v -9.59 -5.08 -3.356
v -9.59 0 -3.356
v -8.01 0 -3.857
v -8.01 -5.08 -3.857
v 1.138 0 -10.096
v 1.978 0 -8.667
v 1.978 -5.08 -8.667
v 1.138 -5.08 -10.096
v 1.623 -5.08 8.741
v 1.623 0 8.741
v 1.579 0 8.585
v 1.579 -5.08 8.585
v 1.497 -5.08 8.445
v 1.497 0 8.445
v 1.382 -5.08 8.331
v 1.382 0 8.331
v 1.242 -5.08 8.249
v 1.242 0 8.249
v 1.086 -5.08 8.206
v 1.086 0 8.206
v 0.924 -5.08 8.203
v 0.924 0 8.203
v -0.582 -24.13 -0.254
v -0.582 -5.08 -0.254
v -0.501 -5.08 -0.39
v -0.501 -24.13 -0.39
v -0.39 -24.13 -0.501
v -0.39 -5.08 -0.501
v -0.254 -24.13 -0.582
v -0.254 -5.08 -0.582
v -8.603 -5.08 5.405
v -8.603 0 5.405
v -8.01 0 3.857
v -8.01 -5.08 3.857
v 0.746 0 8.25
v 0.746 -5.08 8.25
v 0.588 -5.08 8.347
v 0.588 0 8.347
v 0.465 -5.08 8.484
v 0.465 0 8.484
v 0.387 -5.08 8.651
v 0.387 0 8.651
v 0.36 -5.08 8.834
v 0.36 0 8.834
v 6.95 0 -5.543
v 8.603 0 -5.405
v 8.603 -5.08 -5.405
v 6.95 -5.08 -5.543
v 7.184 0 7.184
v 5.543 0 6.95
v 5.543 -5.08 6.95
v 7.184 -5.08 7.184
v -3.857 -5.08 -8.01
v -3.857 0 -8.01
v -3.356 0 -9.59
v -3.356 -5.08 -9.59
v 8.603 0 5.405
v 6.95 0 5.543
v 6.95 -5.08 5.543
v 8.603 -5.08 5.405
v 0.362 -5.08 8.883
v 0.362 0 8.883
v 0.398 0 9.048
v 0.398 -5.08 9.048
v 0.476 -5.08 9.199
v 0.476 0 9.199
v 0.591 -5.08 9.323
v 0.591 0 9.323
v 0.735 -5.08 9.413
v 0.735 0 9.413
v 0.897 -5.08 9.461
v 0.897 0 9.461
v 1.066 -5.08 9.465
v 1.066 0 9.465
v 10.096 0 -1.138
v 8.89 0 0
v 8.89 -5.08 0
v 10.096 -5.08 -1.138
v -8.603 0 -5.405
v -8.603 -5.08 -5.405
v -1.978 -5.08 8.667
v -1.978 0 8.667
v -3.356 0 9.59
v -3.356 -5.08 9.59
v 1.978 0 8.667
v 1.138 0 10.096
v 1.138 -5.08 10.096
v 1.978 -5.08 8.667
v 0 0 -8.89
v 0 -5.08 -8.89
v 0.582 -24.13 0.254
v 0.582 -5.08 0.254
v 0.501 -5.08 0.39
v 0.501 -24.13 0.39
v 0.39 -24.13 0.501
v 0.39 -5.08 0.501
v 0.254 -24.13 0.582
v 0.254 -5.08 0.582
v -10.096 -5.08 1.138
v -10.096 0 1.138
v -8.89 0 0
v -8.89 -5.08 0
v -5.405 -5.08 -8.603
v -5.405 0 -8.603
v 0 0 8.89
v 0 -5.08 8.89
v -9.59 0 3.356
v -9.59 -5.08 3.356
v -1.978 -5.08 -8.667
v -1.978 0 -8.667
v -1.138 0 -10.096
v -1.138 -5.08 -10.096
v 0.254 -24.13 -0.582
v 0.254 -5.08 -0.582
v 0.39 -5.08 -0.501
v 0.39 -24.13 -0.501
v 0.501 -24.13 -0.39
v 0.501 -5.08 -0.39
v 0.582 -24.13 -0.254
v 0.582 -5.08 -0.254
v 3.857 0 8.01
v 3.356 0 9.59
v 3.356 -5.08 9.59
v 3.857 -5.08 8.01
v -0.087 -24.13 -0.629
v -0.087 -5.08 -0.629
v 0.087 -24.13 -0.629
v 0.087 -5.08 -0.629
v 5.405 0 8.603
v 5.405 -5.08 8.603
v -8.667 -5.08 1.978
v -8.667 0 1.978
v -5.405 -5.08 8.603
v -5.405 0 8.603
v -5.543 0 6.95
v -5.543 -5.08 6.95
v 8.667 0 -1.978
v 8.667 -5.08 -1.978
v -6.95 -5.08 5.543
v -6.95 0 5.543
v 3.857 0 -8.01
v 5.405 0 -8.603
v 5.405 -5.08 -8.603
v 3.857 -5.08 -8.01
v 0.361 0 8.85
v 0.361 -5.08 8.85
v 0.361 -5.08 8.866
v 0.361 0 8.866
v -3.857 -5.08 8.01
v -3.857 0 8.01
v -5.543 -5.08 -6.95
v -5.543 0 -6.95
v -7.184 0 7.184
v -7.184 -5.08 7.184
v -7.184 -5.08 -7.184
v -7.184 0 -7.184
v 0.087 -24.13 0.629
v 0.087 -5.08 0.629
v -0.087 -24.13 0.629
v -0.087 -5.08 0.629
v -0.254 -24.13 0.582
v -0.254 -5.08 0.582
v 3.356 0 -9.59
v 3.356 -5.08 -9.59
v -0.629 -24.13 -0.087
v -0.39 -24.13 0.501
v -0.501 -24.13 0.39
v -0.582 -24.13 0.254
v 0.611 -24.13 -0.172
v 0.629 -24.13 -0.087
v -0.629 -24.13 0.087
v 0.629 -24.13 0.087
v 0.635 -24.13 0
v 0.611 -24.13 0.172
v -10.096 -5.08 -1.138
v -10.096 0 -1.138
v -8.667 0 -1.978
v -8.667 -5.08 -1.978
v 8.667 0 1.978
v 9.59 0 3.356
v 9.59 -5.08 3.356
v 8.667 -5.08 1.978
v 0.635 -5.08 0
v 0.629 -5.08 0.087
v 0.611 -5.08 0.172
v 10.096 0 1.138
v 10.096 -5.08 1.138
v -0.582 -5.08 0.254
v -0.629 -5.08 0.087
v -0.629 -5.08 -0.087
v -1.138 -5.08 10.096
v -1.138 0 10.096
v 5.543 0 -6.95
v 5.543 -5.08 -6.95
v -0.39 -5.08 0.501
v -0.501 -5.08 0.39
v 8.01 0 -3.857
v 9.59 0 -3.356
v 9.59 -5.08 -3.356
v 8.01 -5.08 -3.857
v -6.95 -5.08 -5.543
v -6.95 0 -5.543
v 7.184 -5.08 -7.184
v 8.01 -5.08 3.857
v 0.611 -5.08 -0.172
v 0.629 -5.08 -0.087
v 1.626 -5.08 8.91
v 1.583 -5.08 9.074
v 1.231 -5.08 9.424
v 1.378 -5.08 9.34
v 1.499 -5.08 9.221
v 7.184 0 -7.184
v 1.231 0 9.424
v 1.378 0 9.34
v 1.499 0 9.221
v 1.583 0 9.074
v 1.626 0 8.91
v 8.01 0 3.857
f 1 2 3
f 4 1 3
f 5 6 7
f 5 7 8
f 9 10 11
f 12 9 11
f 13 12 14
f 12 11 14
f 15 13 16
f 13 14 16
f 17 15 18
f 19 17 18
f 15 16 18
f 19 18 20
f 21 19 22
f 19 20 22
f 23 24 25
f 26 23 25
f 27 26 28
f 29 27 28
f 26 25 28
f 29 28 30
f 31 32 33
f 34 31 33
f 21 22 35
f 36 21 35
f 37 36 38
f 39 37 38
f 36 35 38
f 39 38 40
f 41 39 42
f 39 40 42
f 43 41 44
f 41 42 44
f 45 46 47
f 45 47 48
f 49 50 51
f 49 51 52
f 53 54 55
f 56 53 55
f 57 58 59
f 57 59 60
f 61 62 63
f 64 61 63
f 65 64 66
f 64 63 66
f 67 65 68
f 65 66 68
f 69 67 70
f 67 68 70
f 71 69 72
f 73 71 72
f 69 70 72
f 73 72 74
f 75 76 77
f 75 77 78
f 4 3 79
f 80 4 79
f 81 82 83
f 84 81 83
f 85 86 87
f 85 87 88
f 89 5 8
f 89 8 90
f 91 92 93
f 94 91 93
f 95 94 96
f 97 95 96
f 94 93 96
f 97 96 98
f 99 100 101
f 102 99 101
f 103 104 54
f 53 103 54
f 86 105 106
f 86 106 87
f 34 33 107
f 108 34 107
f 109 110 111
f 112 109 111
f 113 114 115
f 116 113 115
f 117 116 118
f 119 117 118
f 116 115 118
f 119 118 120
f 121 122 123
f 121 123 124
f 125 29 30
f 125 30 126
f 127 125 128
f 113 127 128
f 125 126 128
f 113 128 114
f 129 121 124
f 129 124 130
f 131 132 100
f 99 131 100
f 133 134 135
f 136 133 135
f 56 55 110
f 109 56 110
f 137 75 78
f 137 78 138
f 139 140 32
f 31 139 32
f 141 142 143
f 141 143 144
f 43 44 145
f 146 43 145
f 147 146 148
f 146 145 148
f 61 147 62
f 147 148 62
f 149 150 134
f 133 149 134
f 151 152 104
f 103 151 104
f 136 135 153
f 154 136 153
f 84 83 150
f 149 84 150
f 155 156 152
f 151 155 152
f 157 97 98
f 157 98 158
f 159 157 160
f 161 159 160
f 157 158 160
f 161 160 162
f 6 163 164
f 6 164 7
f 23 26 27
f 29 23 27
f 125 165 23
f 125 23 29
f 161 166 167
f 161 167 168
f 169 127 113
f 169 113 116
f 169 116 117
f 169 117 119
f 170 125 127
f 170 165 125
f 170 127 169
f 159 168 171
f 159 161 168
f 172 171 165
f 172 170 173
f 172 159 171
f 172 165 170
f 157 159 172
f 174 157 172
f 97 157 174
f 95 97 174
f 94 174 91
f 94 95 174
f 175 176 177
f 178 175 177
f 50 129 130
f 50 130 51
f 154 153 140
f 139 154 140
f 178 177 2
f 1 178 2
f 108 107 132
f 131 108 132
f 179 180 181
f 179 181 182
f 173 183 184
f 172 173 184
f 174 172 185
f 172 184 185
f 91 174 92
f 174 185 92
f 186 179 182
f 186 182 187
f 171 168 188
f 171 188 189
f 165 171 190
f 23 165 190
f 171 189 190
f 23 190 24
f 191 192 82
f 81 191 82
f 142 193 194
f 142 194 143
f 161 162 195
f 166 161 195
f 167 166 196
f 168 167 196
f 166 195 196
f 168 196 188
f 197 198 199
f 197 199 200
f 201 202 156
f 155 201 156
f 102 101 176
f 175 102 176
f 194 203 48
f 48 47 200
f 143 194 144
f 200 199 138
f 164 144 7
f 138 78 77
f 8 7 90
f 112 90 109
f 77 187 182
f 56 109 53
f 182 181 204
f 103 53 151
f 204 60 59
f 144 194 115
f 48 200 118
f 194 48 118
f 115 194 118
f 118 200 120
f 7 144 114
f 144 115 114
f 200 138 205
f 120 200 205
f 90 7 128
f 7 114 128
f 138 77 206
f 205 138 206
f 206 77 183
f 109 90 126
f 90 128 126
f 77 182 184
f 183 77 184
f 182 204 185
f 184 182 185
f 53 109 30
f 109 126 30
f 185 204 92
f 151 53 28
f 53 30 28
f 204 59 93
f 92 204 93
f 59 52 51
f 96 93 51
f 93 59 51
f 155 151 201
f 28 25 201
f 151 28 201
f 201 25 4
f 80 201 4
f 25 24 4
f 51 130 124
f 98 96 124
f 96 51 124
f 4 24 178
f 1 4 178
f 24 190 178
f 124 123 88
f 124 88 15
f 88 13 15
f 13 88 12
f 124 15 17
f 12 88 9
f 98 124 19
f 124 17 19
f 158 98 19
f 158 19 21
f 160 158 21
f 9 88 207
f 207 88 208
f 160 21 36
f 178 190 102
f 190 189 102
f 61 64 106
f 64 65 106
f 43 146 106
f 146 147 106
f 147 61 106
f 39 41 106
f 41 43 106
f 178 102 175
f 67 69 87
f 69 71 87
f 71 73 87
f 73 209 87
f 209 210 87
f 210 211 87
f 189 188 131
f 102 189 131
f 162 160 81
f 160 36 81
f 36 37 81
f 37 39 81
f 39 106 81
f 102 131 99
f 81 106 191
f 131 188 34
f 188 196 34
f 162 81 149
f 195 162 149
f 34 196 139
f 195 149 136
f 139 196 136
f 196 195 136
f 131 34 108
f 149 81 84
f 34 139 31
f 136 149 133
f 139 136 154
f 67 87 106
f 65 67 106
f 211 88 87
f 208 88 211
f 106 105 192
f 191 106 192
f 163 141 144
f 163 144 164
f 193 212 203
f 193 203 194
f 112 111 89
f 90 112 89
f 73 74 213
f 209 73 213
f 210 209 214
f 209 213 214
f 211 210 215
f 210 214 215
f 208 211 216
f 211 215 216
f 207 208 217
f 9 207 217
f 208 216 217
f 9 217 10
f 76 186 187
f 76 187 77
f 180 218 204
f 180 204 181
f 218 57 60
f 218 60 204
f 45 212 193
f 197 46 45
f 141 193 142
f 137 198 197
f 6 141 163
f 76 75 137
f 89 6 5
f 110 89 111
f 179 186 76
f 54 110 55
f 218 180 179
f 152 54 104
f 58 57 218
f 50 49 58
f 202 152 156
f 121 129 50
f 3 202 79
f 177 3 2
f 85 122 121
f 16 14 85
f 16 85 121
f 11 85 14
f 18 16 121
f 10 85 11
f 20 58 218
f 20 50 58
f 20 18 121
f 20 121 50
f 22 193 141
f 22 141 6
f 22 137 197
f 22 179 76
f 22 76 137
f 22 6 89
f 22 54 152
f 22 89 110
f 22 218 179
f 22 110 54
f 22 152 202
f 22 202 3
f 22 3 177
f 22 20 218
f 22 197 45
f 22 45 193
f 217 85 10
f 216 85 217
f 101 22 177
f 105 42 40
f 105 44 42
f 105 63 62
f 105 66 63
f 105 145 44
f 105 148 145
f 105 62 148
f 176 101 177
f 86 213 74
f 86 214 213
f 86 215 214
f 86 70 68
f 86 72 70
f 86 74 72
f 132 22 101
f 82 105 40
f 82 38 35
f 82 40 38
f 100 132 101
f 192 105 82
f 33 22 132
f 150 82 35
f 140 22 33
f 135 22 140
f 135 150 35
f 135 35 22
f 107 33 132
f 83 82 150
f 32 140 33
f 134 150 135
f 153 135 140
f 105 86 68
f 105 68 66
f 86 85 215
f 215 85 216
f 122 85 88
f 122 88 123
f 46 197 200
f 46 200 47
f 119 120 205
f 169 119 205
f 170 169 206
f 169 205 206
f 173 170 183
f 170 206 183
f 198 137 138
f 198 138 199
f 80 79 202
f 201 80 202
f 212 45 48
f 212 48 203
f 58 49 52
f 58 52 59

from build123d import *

# Parameters (mm, degrees)
F1_DEPTH = 5.08
F3_W     = 0.508
F3_H     = 0.508
F4_DEPTH = 19.05
F6_DEPTH = 25.4


with BuildPart() as f1:
    # F0 (on Front) → F1 (new body)
    with BuildSketch(Plane.XZ):
        with BuildLine():
            Line((-4.7297651602, 7.5273781311), (0, 0))
            Line((0, 0), (-3.8572264408, 8.0096132357))
            ThreePointArc((-3.8572264408, 8.0096132357), (-4.3002609064, 7.7807362208), (-4.7297651602, 7.5273781311))
        make_face()
        with BuildLine():
            Line((-5.5428243385, 6.9504818791), (0, 0))
            Line((0, 0), (-4.7297651602, 7.5273781311))
            ThreePointArc((-4.7297651602, 7.5273781311), (-5.144387823, 7.250336125), (-5.5428243385, 6.9504818791))
        make_face()
        with BuildLine():
            Line((-5.4054458974, 8.6027178642), (-5.5428243385, 6.9504818791))
            ThreePointArc((-5.5428243385, 6.9504818791), (-5.144387823, 7.250336125), (-4.7297651602, 7.5273781311))
            Line((-4.7297651602, 7.5273781311), (-5.4054458974, 8.6027178642))
        make_face()
        with BuildLine():
            Line((-5.4054458974, 8.6027178642), (-4.7297651602, 7.5273781311))
            ThreePointArc((-4.7297651602, 7.5273781311), (-4.3002609064, 7.7807362208), (-3.8572264408, 8.0096132357))
            Line((-3.8572264408, 8.0096132357), (-5.4054458974, 8.6027178642))
        make_face()
        with BuildLine():
            Line((-3.3556352695, 9.5898546359), (-3.8572264408, 8.0096132357))
            ThreePointArc((-3.8572264408, 8.0096132357), (-3.4020557137, 8.213289044), (-2.9361808608, 8.3911228064))
            Line((-2.9361808608, 8.3911228064), (-3.3556352695, 9.5898546359))
        make_face()
        with BuildLine():
            Line((-3.3556352695, 9.5898546359), (-2.9361808608, 8.3911228064))
            ThreePointArc((-2.9361808608, 8.3911228064), (-2.4610676966, 8.5425549921), (-1.9782111029, 8.6671091393))
            Line((-1.9782111029, 8.6671091393), (-3.3556352695, 9.5898546359))
        make_face()
        with BuildLine():
            Line((-2.9361808608, 8.3911228064), (0, 0))
            Line((0, 0), (-1.9782111029, 8.6671091393))
            ThreePointArc((-1.9782111029, 8.6671091393), (-2.4610676966, 8.5425549921), (-2.9361808608, 8.3911228064))
        make_face()
        with BuildLine():
            Line((-3.8572264408, 8.0096132357), (0, 0))
            Line((0, 0), (-2.9361808608, 8.3911228064))
            ThreePointArc((-2.9361808608, 8.3911228064), (-3.4020557137, 8.213289044), (-3.8572264408, 8.0096132357))
        make_face()
        with BuildLine():
            Line((-0.9953641926, 8.834101546), (0, 0))
            Line((0, 0), (0, 8.89))
            ThreePointArc((0, 8.89), (-0.4984662759, 8.8760143855), (-0.9953641926, 8.834101546))
        make_face()
        with BuildLine():
            ThreePointArc((-0.9953641926, 8.834101546), (-0.4984662759, 8.8760143855), (0, 8.89))
            Line((0, 8.89), (-1.1375590772, 10.0961160525))
            Line((-1.1375590772, 10.0961160525), (-0.9953641926, 8.834101546))
        make_face()
        with BuildLine():
            Line((-1.1375590772, 10.0961160525), (-1.9782111029, 8.6671091393))
            ThreePointArc((-1.9782111029, 8.6671091393), (-1.4891303252, 8.7643933546), (-0.9953641926, 8.834101546))
            Line((-0.9953641926, 8.834101546), (-1.1375590772, 10.0961160525))
        make_face()
        with BuildLine():
            Line((-1.9782111029, 8.6671091393), (0, 0))
            Line((0, 0), (-0.9953641926, 8.834101546))
            ThreePointArc((-0.9953641926, 8.834101546), (-1.4891303252, 8.7643933546), (-1.9782111029, 8.6671091393))
        make_face()
        with BuildLine():
            Line((-6.2861792847, 6.2861792847), (0, 0))
            Line((0, 0), (-5.5428243385, 6.9504818791))
            ThreePointArc((-5.5428243385, 6.9504818791), (-5.923821078, 6.6287588458), (-6.2861792847, 6.2861792847))
        make_face()
        with BuildLine():
            Line((-7.1842048969, 7.1842048969), (-6.2861792847, 6.2861792847))
            ThreePointArc((-6.2861792847, 6.2861792847), (-5.923821078, 6.6287588458), (-5.5428243385, 6.9504818791))
            Line((-5.5428243385, 6.9504818791), (-7.1842048969, 7.1842048969))
        make_face()
        with BuildLine():
            Line((-6.9504818791, 5.5428243385), (0, 0))
            Line((0, 0), (-6.2861792847, 6.2861792847))
            ThreePointArc((-6.2861792847, 6.2861792847), (-6.6287588458, 5.923821078), (-6.9504818791, 5.5428243385))
        make_face()
        with BuildLine():
            Line((-7.1842048969, 7.1842048969), (-6.9504818791, 5.5428243385))
            ThreePointArc((-6.9504818791, 5.5428243385), (-6.6287588458, 5.923821078), (-6.2861792847, 6.2861792847))
            Line((-6.2861792847, 6.2861792847), (-7.1842048969, 7.1842048969))
        make_face()
        with BuildLine():
            Line((-7.5273781311, 4.7297651602), (0, 0))
            Line((0, 0), (-6.9504818791, 5.5428243385))
            ThreePointArc((-6.9504818791, 5.5428243385), (-7.250336125, 5.144387823), (-7.5273781311, 4.7297651602))
        make_face()
        with BuildLine():
            Line((-8.6027178642, 5.4054458974), (-7.5273781311, 4.7297651602))
            ThreePointArc((-7.5273781311, 4.7297651602), (-7.250336125, 5.144387823), (-6.9504818791, 5.5428243385))
            Line((-6.9504818791, 5.5428243385), (-8.6027178642, 5.4054458974))
        make_face()
        with BuildLine():
            Line((-8.6027178642, 5.4054458974), (-8.0096132357, 3.8572264408))
            ThreePointArc((-8.0096132357, 3.8572264408), (-7.7807362208, 4.3002609064), (-7.5273781311, 4.7297651602))
            Line((-7.5273781311, 4.7297651602), (-8.6027178642, 5.4054458974))
        make_face()
        with BuildLine():
            Line((-8.0096132357, 3.8572264408), (0, 0))
            Line((0, 0), (-7.5273781311, 4.7297651602))
            ThreePointArc((-7.5273781311, 4.7297651602), (-7.7807362208, 4.3002609064), (-8.0096132357, 3.8572264408))
        make_face()
        with BuildLine():
            Line((-8.3911228064, 2.9361808608), (0, 0))
            Line((0, 0), (-8.0096132357, 3.8572264408))
            ThreePointArc((-8.0096132357, 3.8572264408), (-8.213289044, 3.4020557137), (-8.3911228064, 2.9361808608))
        make_face()
        with BuildLine():
            Line((-9.5898546359, 3.3556352695), (-8.3911228064, 2.9361808608))
            ThreePointArc((-8.3911228064, 2.9361808608), (-8.213289044, 3.4020557137), (-8.0096132357, 3.8572264408))
            Line((-8.0096132357, 3.8572264408), (-9.5898546359, 3.3556352695))
        make_face()
        with BuildLine():
            Line((-9.5898546359, 3.3556352695), (-8.6671091393, 1.9782111029))
            ThreePointArc((-8.6671091393, 1.9782111029), (-8.5425549921, 2.4610676966), (-8.3911228064, 2.9361808608))
            Line((-8.3911228064, 2.9361808608), (-9.5898546359, 3.3556352695))
        make_face()
        with BuildLine():
            Line((-8.6671091393, 1.9782111029), (0, 0))
            Line((0, 0), (-8.3911228064, 2.9361808608))
            ThreePointArc((-8.3911228064, 2.9361808608), (-8.5425549921, 2.4610676966), (-8.6671091393, 1.9782111029))
        make_face()
        with BuildLine():
            Line((-8.834101546, 0.9953641926), (0, 0))
            Line((0, 0), (-8.6671091393, 1.9782111029))
            ThreePointArc((-8.6671091393, 1.9782111029), (-8.7643933546, 1.4891303252), (-8.834101546, 0.9953641926))
        make_face()
        with BuildLine():
            Line((-10.0961160525, 1.1375590772), (-8.834101546, 0.9953641926))
            ThreePointArc((-8.834101546, 0.9953641926), (-8.7643933546, 1.4891303252), (-8.6671091393, 1.9782111029))
            Line((-8.6671091393, 1.9782111029), (-10.0961160525, 1.1375590772))
        make_face()
        with BuildLine():
            Line((-10.0961160525, 1.1375590772), (-8.89, 0))
            ThreePointArc((-8.89, 0), (-8.8760143855, 0.4984662759), (-8.834101546, 0.9953641926))
            Line((-8.834101546, 0.9953641926), (-10.0961160525, 1.1375590772))
        make_face()
        with BuildLine():
            Line((-8.89, 0), (0, 0))
            Line((0, 0), (-8.834101546, 0.9953641926))
            ThreePointArc((-8.834101546, 0.9953641926), (-8.8760143855, 0.4984662759), (-8.89, 0))
        make_face()
        with BuildLine():
            Line((-8.834101546, -0.9953641926), (0, 0))
            Line((0, 0), (-8.89, 0))
            ThreePointArc((-8.89, 0), (-8.8760143855, -0.4984662759), (-8.834101546, -0.9953641926))
        make_face()
        with BuildLine():
            Line((-10.0961160525, -1.1375590772), (-8.834101546, -0.9953641926))
            ThreePointArc((-8.834101546, -0.9953641926), (-8.8760143855, -0.4984662759), (-8.89, 0))
            Line((-8.89, 0), (-10.0961160525, -1.1375590772))
        make_face()
        with BuildLine():
            Line((-10.0961160525, -1.1375590772), (-8.6671091393, -1.9782111029))
            ThreePointArc((-8.6671091393, -1.9782111029), (-8.7643933546, -1.4891303252), (-8.834101546, -0.9953641926))
            Line((-8.834101546, -0.9953641926), (-10.0961160525, -1.1375590772))
        make_face()
        with BuildLine():
            Line((-8.6671091393, -1.9782111029), (0, 0))
            Line((0, 0), (-8.834101546, -0.9953641926))
            ThreePointArc((-8.834101546, -0.9953641926), (-8.7643933546, -1.4891303252), (-8.6671091393, -1.9782111029))
        make_face()
        with BuildLine():
            Line((-8.3911228064, -2.9361808608), (0, 0))
            Line((0, 0), (-8.6671091393, -1.9782111029))
            ThreePointArc((-8.6671091393, -1.9782111029), (-8.5425549921, -2.4610676966), (-8.3911228064, -2.9361808608))
        make_face()
        with BuildLine():
            Line((-9.5898546359, -3.3556352695), (-8.3911228064, -2.9361808608))
            ThreePointArc((-8.3911228064, -2.9361808608), (-8.5425549921, -2.4610676966), (-8.6671091393, -1.9782111029))
            Line((-8.6671091393, -1.9782111029), (-9.5898546359, -3.3556352695))
        make_face()
        with BuildLine():
            Line((-9.5898546359, -3.3556352695), (-8.0096132357, -3.8572264408))
            ThreePointArc((-8.0096132357, -3.8572264408), (-8.213289044, -3.4020557137), (-8.3911228064, -2.9361808608))
            Line((-8.3911228064, -2.9361808608), (-9.5898546359, -3.3556352695))
        make_face()
        with BuildLine():
            Line((-8.0096132357, -3.8572264408), (0, 0))
            Line((0, 0), (-8.3911228064, -2.9361808608))
            ThreePointArc((-8.3911228064, -2.9361808608), (-8.213289044, -3.4020557137), (-8.0096132357, -3.8572264408))
        make_face()
        with BuildLine():
            Line((-7.5273781311, -4.7297651602), (0, 0))
            Line((0, 0), (-8.0096132357, -3.8572264408))
            ThreePointArc((-8.0096132357, -3.8572264408), (-7.7807362208, -4.3002609064), (-7.5273781311, -4.7297651602))
        make_face()
        with BuildLine():
            Line((-8.6027178642, -5.4054458974), (-7.5273781311, -4.7297651602))
            ThreePointArc((-7.5273781311, -4.7297651602), (-7.7807362208, -4.3002609064), (-8.0096132357, -3.8572264408))
            Line((-8.0096132357, -3.8572264408), (-8.6027178642, -5.4054458974))
        make_face()
        with BuildLine():
            Line((-8.6027178642, -5.4054458974), (-6.9504818791, -5.5428243385))
            ThreePointArc((-6.9504818791, -5.5428243385), (-7.250336125, -5.144387823), (-7.5273781311, -4.7297651602))
            Line((-7.5273781311, -4.7297651602), (-8.6027178642, -5.4054458974))
        make_face()
        with BuildLine():
            Line((-6.9504818791, -5.5428243385), (0, 0))
            Line((0, 0), (-7.5273781311, -4.7297651602))
            ThreePointArc((-7.5273781311, -4.7297651602), (-7.250336125, -5.144387823), (-6.9504818791, -5.5428243385))
        make_face()
        with BuildLine():
            Line((-6.2861792847, -6.2861792847), (0, 0))
            Line((0, 0), (-6.9504818791, -5.5428243385))
            ThreePointArc((-6.9504818791, -5.5428243385), (-6.6287588458, -5.923821078), (-6.2861792847, -6.2861792847))
        make_face()
        with BuildLine():
            Line((-5.5428243385, -6.9504818791), (0, 0))
            Line((0, 0), (-6.2861792847, -6.2861792847))
            ThreePointArc((-6.2861792847, -6.2861792847), (-5.923821078, -6.6287588458), (-5.5428243385, -6.9504818791))
        make_face()
        with BuildLine():
            Line((-4.7297651602, -7.5273781311), (0, 0))
            Line((0, 0), (-5.5428243385, -6.9504818791))
            ThreePointArc((-5.5428243385, -6.9504818791), (-5.144387823, -7.250336125), (-4.7297651602, -7.5273781311))
        make_face()
        with BuildLine():
            Line((-7.1842048969, -7.1842048969), (-6.2861792847, -6.2861792847))
            ThreePointArc((-6.2861792847, -6.2861792847), (-6.6287588458, -5.923821078), (-6.9504818791, -5.5428243385))
            Line((-6.9504818791, -5.5428243385), (-7.1842048969, -7.1842048969))
        make_face()
        with BuildLine():
            Line((-7.1842048969, -7.1842048969), (-5.5428243385, -6.9504818791))
            ThreePointArc((-5.5428243385, -6.9504818791), (-5.923821078, -6.6287588458), (-6.2861792847, -6.2861792847))
            Line((-6.2861792847, -6.2861792847), (-7.1842048969, -7.1842048969))
        make_face()
        with BuildLine():
            Line((-5.4054458974, -8.6027178642), (-4.7297651602, -7.5273781311))
            ThreePointArc((-4.7297651602, -7.5273781311), (-5.144387823, -7.250336125), (-5.5428243385, -6.9504818791))
            Line((-5.5428243385, -6.9504818791), (-5.4054458974, -8.6027178642))
        make_face()
        with BuildLine():
            Line((-5.4054458974, -8.6027178642), (-3.8572264408, -8.0096132357))
            ThreePointArc((-3.8572264408, -8.0096132357), (-4.3002609064, -7.7807362208), (-4.7297651602, -7.5273781311))
            Line((-4.7297651602, -7.5273781311), (-5.4054458974, -8.6027178642))
        make_face()
        with BuildLine():
            Line((-2.9361808608, -8.3911228064), (0, 0))
            Line((0, 0), (-3.8572264408, -8.0096132357))
            ThreePointArc((-3.8572264408, -8.0096132357), (-3.4020557137, -8.213289044), (-2.9361808608, -8.3911228064))
        make_face()
        with BuildLine():
            Line((-3.3556352695, -9.5898546359), (-2.9361808608, -8.3911228064))
            ThreePointArc((-2.9361808608, -8.3911228064), (-3.4020557137, -8.213289044), (-3.8572264408, -8.0096132357))
            Line((-3.8572264408, -8.0096132357), (-3.3556352695, -9.5898546359))
        make_face()
        with BuildLine():
            Line((-3.3556352695, -9.5898546359), (-1.9782111029, -8.6671091393))
            ThreePointArc((-1.9782111029, -8.6671091393), (-2.4610676966, -8.5425549921), (-2.9361808608, -8.3911228064))
            Line((-2.9361808608, -8.3911228064), (-3.3556352695, -9.5898546359))
        make_face()
        with BuildLine():
            Line((-1.9782111029, -8.6671091393), (0, 0))
            Line((0, 0), (-2.9361808608, -8.3911228064))
            ThreePointArc((-2.9361808608, -8.3911228064), (-2.4610676966, -8.5425549921), (-1.9782111029, -8.6671091393))
        make_face()
        with BuildLine():
            Line((-0.9953641926, -8.834101546), (0, 0))
            Line((0, 0), (-1.9782111029, -8.6671091393))
            ThreePointArc((-1.9782111029, -8.6671091393), (-1.4891303252, -8.7643933546), (-0.9953641926, -8.834101546))
        make_face()
        with BuildLine():
            Line((-1.1375590772, -10.0961160525), (0, -8.89))
            ThreePointArc((0, -8.89), (-0.4984662759, -8.8760143855), (-0.9953641926, -8.834101546))
            Line((-0.9953641926, -8.834101546), (-1.1375590772, -10.0961160525))
        make_face()
        with BuildLine():
            ThreePointArc((-0.9953641926, -8.834101546), (-1.4891303252, -8.7643933546), (-1.9782111029, -8.6671091393))
            Line((-1.9782111029, -8.6671091393), (-1.1375590772, -10.0961160525))
            Line((-1.1375590772, -10.0961160525), (-0.9953641926, -8.834101546))
        make_face()
        with BuildLine():
            Line((0, -8.89), (0, 0))
            Line((0, 0), (-0.9953641926, -8.834101546))
            ThreePointArc((-0.9953641926, -8.834101546), (-0.4984662759, -8.8760143855), (0, -8.89))
        make_face()
        with BuildLine():
            Line((-3.8572264408, -8.0096132357), (0, 0))
            Line((0, 0), (-4.7297651602, -7.5273781311))
            ThreePointArc((-4.7297651602, -7.5273781311), (-4.3002609064, -7.7807362208), (-3.8572264408, -8.0096132357))
        make_face()
    extrude(amount=F1_DEPTH)

    # F2: F1 across plane


with BuildPart() as f1_1:
    add(f1.part)
    add(f1.part.mirror(Plane.YZ))

    # F3 (on face) → F4 (join)
    with BuildSketch(Plane.XZ.offset(5.08)):
        with BuildLine():
            Line((0.254, 0.254), (0.254, 0.5819871133))
            ThreePointArc((0.254, 0.5819871133), (0, 0.635), (-0.254, 0.5819871133))
            Line((-0.254, 0.5819871133), (-0.254, 0.254))
            Line((-0.254, 0.254), (0.254, 0.254))
        make_face()
        with BuildLine():
            Line((-0.254, -0.254), (-0.254, 0.254))
            Line((-0.254, 0.254), (-0.5819871133, 0.254))
            ThreePointArc((-0.5819871133, 0.254), (-0.635, 0), (-0.5819871133, -0.254))
            Line((-0.5819871133, -0.254), (-0.254, -0.254))
        make_face()
        Rectangle(F3_W, F3_H)
        with BuildLine():
            ThreePointArc((0.5819871133, -0.254), (0.6216055087, -0.1297366237), (0.635, 0))
            ThreePointArc((0.635, 0), (0.6216055087, 0.1297366237), (0.5819871133, 0.254))
            Line((0.5819871133, 0.254), (0.254, 0.254))
            Line((0.254, 0.254), (0.254, -0.254))
            Line((0.254, -0.254), (0.5819871133, -0.254))
        make_face()
        with BuildLine():
            ThreePointArc((-0.254, -0.5819871133), (0, -0.635), (0.254, -0.5819871133))
            Line((0.254, -0.5819871133), (0.254, -0.254))
            Line((0.254, -0.254), (-0.254, -0.254))
            Line((-0.254, -0.254), (-0.254, -0.5819871133))
        make_face()
        with BuildLine():
            Line((0.254, 0.254), (0.5819871133, 0.254))
            ThreePointArc((0.5819871133, 0.254), (0.4490128061, 0.4490128061), (0.254, 0.5819871133))
            Line((0.254, 0.5819871133), (0.254, 0.254))
        make_face()
        with BuildLine():
            Line((-0.254, 0.254), (-0.254, 0.5819871133))
            ThreePointArc((-0.254, 0.5819871133), (-0.4490128061, 0.4490128061), (-0.5819871133, 0.254))
            Line((-0.5819871133, 0.254), (-0.254, 0.254))
        make_face()
        with BuildLine():
            ThreePointArc((-0.5819871133, -0.254), (-0.4490128061, -0.4490128061), (-0.254, -0.5819871133))
            Line((-0.254, -0.5819871133), (-0.254, -0.254))
            Line((-0.254, -0.254), (-0.5819871133, -0.254))
        make_face()
        with BuildLine():
            ThreePointArc((0.254, -0.5819871133), (0.4490128061, -0.4490128061), (0.5819871133, -0.254))
            Line((0.5819871133, -0.254), (0.254, -0.254))
            Line((0.254, -0.254), (0.254, -0.5819871133))
        make_face()
    extrude(amount=F4_DEPTH)

    # F5 (on face) → F6 (cut)
    with BuildSketch(Plane(origin=(0, 0, 0), x_dir=(-1, 0, 0), z_dir=(0, 1, 0))):
        with BuildLine():
            ThreePointArc((-1.623429695, 8.7405134875), (-1.3102328181, 8.7929170338), (-0.9953641926, 8.834101546))
            Line((-0.9953641926, 8.834101546), (-1.0664616349, 9.4651087992))
            ThreePointArc((-1.0664616349, 9.4651087992), (-1.4988190538, 9.2210875957), (-1.623429695, 8.7405134875))
        make_face()
        with BuildLine():
            ThreePointArc((-0.9953641926, 8.834101546), (-0.6792255648, 8.8640144761), (-0.3622203014, 8.8826176577))
            ThreePointArc((-0.3622203014, 8.8826176577), (-0.5906444931, 9.3234142934), (-1.0664616349, 9.4651087992))
            Line((-1.0664616349, 9.4651087992), (-0.9953641926, 8.834101546))
        make_face()
        with BuildLine():
            ThreePointArc((-0.3603641926, 8.834101546), (-0.3608283894, 8.8583773479), (-0.3622203014, 8.8826176577))
            ThreePointArc((-0.3622203014, 8.8826176577), (-0.6792255648, 8.8640144761), (-0.9953641926, 8.834101546))
            Line((-0.9953641926, 8.834101546), (-0.9242667502, 8.2030942927))
            ThreePointArc((-0.9242667502, 8.2030942927), (-0.5218814179, 8.410971469), (-0.3603641926, 8.834101546))
        make_face()
        with BuildLine():
            Line((-0.9242667502, 8.2030942927), (-0.9953641926, 8.834101546))
            ThreePointArc((-0.9953641926, 8.834101546), (-1.3102328181, 8.7929170338), (-1.623429695, 8.7405134875))
            ThreePointArc((-1.623429695, 8.7405134875), (-1.3823502424, 8.3306466848), (-0.9242667502, 8.2030942927))
        make_face()
    extrude(amount=-F6_DEPTH, mode=Mode.SUBTRACT)


solid = f1_1.part
